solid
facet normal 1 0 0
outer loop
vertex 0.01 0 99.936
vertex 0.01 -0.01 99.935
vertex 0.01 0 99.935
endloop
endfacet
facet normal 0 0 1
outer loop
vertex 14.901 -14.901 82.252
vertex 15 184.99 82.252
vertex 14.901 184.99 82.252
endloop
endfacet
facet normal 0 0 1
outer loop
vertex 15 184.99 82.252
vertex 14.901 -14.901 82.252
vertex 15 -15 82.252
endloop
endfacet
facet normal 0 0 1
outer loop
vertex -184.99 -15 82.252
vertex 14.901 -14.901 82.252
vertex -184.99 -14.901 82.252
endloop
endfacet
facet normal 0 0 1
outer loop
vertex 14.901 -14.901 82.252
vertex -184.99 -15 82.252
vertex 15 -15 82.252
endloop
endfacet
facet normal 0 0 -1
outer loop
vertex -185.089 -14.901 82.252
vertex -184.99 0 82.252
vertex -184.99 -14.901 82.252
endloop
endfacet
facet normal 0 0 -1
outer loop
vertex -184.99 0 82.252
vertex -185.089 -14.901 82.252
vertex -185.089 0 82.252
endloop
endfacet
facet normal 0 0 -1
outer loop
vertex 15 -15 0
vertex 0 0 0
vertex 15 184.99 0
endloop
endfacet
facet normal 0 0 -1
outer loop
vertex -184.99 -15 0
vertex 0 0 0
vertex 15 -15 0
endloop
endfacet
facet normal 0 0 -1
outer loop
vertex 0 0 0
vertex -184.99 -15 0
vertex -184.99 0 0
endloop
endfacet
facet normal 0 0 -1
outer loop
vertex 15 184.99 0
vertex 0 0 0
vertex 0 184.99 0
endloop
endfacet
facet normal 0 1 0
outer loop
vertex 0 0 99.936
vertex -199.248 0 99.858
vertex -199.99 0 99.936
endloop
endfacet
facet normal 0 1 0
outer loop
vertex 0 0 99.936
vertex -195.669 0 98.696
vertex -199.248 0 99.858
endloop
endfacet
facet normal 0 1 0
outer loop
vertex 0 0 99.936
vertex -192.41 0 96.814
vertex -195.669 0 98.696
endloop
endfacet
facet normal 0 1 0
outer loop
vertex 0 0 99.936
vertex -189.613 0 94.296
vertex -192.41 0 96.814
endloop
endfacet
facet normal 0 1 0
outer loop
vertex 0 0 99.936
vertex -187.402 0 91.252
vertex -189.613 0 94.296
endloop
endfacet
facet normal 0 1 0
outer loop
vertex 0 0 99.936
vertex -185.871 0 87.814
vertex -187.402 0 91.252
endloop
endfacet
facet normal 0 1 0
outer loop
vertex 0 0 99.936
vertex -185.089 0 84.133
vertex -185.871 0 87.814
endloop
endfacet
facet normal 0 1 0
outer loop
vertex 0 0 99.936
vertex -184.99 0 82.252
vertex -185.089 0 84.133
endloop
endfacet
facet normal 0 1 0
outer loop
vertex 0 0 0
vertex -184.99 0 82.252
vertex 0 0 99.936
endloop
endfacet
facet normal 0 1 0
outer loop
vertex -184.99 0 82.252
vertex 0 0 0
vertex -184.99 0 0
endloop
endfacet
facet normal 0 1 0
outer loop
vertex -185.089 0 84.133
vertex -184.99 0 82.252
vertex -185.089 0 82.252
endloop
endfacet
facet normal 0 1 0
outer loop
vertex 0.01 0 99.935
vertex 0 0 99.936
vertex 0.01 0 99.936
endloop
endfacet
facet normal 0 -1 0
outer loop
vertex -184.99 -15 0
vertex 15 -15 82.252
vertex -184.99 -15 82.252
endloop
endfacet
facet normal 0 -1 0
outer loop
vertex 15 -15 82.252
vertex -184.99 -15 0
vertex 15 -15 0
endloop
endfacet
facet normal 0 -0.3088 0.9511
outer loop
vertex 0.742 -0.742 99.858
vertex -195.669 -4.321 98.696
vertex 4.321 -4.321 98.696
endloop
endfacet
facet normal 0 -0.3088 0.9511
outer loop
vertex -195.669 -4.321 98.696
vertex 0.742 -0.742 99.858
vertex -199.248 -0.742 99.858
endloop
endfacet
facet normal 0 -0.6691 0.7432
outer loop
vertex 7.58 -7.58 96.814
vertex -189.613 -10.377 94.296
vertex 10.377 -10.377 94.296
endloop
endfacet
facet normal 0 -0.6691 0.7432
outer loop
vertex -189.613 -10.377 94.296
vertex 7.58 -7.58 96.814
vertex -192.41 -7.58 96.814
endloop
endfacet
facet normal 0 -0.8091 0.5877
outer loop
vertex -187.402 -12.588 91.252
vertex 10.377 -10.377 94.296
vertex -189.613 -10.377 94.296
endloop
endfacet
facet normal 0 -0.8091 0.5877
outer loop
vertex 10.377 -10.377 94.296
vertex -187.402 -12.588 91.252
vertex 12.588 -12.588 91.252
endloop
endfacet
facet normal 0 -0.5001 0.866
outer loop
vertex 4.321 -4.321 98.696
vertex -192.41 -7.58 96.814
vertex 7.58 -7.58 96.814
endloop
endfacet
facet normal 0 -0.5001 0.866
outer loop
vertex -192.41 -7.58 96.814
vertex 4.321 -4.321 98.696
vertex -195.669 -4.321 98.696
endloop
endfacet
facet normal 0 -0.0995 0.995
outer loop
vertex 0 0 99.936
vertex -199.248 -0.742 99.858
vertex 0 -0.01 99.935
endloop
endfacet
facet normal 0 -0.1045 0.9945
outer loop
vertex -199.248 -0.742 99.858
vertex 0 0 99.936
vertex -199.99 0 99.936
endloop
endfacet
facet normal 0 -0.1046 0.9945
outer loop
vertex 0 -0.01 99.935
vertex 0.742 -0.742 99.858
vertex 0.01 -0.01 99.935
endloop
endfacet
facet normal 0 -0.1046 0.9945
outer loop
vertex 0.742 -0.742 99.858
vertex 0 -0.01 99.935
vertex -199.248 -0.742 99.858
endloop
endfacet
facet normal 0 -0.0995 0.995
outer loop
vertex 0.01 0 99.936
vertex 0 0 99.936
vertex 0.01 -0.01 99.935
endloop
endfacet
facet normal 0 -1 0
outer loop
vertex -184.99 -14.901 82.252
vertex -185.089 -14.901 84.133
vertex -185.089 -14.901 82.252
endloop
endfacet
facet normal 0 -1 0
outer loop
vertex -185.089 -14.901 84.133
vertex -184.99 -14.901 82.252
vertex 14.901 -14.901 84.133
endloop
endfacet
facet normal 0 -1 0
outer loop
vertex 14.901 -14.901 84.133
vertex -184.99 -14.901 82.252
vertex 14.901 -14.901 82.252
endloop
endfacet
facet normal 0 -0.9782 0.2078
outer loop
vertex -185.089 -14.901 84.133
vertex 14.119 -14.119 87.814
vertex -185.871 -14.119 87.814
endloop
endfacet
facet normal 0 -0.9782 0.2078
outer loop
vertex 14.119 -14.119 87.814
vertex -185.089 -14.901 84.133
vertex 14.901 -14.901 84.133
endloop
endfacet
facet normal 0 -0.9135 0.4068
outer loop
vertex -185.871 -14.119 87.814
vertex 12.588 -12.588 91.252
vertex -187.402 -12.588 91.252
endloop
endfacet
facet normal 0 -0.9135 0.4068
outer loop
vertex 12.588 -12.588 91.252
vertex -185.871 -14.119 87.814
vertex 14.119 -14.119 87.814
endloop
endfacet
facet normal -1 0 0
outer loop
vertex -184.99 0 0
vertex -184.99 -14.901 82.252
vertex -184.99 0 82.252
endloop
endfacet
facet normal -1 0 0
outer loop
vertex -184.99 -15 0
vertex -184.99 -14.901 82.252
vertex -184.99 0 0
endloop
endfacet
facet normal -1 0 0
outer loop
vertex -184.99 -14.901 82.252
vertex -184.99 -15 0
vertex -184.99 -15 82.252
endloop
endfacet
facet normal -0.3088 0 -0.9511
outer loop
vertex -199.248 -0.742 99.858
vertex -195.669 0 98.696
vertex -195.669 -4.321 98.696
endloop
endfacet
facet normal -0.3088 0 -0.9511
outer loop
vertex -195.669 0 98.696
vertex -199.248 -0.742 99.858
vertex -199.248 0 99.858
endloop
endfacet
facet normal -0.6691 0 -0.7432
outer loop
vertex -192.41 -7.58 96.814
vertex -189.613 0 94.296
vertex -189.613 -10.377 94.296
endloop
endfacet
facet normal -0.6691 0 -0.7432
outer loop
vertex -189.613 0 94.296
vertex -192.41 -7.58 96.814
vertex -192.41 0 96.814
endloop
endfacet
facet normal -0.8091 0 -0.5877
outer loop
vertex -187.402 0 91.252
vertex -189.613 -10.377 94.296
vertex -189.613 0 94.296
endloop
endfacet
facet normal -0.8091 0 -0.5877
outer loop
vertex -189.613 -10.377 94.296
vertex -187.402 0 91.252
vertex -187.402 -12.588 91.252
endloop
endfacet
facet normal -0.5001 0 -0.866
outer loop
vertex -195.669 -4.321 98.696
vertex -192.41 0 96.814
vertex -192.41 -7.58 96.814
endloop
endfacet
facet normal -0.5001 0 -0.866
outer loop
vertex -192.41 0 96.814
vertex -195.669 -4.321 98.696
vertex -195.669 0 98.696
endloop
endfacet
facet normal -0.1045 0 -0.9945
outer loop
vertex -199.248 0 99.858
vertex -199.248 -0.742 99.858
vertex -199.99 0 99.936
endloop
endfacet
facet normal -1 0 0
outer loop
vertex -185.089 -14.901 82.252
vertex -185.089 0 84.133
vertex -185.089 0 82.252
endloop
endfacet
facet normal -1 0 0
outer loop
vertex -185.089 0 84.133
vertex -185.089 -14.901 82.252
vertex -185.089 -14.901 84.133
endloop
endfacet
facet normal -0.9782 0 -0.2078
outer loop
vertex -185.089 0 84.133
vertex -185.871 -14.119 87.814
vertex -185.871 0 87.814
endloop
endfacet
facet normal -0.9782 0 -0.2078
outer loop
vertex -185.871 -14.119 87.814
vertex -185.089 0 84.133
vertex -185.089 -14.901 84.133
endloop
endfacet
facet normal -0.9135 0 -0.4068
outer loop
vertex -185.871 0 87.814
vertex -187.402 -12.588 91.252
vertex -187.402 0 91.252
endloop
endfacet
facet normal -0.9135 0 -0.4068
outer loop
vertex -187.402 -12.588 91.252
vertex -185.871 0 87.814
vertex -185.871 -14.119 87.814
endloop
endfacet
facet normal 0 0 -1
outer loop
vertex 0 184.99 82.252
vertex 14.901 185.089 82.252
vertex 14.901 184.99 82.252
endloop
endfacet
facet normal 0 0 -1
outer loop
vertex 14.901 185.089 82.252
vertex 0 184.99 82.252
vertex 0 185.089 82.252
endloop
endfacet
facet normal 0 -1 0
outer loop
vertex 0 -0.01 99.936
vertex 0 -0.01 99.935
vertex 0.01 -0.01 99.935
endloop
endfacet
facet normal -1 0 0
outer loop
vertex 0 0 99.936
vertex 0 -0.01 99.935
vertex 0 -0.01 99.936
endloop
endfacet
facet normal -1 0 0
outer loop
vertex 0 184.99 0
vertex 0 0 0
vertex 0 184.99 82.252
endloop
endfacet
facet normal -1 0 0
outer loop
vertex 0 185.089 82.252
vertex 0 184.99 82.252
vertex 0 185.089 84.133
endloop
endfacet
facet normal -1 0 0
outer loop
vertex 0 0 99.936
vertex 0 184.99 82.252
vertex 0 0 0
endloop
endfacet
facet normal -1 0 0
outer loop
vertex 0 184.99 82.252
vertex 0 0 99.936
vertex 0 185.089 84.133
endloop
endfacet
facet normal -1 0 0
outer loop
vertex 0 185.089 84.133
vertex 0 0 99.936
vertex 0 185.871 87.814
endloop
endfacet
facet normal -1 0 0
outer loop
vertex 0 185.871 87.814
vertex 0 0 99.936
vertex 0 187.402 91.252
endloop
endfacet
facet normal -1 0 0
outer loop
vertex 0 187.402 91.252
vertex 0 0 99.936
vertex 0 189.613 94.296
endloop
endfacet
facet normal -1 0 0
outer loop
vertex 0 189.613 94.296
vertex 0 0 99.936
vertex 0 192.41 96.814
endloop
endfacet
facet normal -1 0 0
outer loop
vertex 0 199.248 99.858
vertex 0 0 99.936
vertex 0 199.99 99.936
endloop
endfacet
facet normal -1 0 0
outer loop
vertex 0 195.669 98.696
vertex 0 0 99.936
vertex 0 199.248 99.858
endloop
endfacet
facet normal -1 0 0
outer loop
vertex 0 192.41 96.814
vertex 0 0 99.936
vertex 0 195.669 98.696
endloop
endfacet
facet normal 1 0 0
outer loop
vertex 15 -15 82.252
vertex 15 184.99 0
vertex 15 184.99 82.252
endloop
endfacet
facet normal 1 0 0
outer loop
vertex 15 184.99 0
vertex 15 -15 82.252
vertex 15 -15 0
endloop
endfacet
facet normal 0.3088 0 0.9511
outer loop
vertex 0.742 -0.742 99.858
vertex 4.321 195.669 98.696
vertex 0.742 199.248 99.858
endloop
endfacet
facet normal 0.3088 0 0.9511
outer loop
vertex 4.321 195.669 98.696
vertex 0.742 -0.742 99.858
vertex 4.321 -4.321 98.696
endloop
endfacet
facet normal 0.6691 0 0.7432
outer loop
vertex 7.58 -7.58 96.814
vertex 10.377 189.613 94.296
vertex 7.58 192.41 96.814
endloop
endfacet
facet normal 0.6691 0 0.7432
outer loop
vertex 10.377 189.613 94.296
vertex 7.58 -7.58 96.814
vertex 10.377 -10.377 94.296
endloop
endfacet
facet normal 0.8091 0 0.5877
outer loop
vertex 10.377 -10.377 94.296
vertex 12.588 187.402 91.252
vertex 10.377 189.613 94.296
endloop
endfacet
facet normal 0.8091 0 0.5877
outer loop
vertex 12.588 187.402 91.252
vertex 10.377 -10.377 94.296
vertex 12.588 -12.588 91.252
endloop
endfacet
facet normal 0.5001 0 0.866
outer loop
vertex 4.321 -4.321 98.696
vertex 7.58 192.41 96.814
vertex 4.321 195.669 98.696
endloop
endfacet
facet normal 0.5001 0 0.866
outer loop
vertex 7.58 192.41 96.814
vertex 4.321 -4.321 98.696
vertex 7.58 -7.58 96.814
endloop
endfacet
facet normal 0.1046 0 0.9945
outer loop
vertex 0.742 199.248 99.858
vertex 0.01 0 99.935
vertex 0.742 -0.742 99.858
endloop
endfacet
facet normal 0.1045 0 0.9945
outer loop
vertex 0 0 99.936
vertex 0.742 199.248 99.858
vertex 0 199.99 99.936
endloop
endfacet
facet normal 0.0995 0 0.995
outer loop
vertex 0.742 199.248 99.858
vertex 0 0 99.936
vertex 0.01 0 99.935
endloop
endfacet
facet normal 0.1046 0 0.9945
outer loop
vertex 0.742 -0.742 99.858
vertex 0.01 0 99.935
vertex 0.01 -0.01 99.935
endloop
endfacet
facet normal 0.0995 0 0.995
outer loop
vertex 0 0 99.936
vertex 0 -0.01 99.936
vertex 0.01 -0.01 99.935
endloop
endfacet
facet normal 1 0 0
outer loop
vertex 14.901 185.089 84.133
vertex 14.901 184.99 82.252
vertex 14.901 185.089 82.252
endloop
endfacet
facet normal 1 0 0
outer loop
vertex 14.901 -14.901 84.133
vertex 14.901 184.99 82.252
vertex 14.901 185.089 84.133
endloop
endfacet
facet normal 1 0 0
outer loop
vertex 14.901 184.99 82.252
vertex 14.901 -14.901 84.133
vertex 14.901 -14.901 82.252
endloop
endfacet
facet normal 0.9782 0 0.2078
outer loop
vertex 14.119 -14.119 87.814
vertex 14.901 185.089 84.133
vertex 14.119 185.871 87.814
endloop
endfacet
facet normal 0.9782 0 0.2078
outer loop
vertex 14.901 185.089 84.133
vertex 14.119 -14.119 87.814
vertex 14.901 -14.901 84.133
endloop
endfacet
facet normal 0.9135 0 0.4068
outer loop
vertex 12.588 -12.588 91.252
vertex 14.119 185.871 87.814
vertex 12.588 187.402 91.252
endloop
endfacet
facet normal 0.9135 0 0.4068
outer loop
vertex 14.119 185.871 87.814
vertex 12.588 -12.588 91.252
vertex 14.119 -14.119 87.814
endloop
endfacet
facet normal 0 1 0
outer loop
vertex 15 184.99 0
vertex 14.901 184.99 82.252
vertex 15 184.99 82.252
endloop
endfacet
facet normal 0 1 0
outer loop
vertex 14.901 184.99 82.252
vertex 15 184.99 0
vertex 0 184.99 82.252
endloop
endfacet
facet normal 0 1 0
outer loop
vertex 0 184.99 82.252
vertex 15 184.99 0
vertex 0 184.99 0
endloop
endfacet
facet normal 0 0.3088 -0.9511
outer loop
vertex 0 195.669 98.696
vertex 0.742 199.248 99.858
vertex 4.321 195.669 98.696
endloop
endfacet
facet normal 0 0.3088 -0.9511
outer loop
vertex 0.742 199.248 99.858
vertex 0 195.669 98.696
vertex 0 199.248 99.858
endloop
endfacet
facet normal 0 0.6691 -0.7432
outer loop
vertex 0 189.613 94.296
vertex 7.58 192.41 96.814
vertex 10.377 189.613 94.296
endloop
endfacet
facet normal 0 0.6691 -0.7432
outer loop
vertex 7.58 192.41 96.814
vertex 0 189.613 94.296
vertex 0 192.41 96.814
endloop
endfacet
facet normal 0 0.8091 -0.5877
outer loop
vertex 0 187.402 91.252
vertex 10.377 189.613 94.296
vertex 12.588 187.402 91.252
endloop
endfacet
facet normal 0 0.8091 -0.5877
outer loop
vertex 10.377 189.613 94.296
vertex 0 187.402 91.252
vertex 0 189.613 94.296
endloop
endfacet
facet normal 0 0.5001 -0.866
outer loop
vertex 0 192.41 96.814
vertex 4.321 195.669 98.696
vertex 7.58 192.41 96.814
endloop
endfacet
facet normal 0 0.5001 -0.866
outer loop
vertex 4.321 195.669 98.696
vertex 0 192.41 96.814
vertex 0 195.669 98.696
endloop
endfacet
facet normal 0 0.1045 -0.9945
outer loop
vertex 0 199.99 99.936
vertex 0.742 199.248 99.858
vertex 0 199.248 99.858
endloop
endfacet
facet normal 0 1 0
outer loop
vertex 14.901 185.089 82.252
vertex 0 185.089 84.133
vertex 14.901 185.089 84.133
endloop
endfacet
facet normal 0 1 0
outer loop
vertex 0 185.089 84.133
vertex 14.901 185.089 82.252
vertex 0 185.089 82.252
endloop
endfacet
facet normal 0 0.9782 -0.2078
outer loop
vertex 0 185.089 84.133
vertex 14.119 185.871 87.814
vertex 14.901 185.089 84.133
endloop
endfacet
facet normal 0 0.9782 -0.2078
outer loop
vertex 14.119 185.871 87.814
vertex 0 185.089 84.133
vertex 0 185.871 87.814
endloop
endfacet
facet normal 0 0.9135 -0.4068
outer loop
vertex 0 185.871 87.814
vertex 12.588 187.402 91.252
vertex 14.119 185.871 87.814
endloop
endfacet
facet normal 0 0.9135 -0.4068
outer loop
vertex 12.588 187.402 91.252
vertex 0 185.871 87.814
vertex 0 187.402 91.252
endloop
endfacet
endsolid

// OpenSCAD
module skirting(h, t, l)
{
    cylr = 1.2*t;
    cylh = sqrt(2*cylr*t - t*t);
    translate([-l/2,-t,0])
        intersection()
        {
            union ()
            {
                cube(size=[l,t,h-cylh]);
                translate([0,cylr,h-cylh]) rotate([0,90,0]) cylinder(r=cylr, h=l);
            }
            cube(size=[l,t,h]);
        }
}


//union()
//{
//   translate([-200,-15,0]) skirting(100, 15, 200);
//   rotate([0,0,90]) translate([   0,-15,0]) skirting(100, 15, 200);
//}

delta = 0.01;

union()
{
    translate([-100+delta,0,0])
    {
        difference()
        {
            skirting(100, 15, 200);
            translate([-100,0,0]) rotate([0,0,90]) skirting(100, 15, 200);
        }
    }
    rotate([0,0,90]) translate([100-delta,0,0])
    {
            difference()
            {
                skirting(100, 15, 200);
                translate([100,0,0]) rotate([0,0,-90]) skirting(100, 15, 200);
            }
    }
    intersection()
    {
        translate([-100+15,0,0]) skirting(100, 15, 200);
        rotate([0,0,90]) translate([-100,0,0]) skirting(100, 15, 200);
    }
}
